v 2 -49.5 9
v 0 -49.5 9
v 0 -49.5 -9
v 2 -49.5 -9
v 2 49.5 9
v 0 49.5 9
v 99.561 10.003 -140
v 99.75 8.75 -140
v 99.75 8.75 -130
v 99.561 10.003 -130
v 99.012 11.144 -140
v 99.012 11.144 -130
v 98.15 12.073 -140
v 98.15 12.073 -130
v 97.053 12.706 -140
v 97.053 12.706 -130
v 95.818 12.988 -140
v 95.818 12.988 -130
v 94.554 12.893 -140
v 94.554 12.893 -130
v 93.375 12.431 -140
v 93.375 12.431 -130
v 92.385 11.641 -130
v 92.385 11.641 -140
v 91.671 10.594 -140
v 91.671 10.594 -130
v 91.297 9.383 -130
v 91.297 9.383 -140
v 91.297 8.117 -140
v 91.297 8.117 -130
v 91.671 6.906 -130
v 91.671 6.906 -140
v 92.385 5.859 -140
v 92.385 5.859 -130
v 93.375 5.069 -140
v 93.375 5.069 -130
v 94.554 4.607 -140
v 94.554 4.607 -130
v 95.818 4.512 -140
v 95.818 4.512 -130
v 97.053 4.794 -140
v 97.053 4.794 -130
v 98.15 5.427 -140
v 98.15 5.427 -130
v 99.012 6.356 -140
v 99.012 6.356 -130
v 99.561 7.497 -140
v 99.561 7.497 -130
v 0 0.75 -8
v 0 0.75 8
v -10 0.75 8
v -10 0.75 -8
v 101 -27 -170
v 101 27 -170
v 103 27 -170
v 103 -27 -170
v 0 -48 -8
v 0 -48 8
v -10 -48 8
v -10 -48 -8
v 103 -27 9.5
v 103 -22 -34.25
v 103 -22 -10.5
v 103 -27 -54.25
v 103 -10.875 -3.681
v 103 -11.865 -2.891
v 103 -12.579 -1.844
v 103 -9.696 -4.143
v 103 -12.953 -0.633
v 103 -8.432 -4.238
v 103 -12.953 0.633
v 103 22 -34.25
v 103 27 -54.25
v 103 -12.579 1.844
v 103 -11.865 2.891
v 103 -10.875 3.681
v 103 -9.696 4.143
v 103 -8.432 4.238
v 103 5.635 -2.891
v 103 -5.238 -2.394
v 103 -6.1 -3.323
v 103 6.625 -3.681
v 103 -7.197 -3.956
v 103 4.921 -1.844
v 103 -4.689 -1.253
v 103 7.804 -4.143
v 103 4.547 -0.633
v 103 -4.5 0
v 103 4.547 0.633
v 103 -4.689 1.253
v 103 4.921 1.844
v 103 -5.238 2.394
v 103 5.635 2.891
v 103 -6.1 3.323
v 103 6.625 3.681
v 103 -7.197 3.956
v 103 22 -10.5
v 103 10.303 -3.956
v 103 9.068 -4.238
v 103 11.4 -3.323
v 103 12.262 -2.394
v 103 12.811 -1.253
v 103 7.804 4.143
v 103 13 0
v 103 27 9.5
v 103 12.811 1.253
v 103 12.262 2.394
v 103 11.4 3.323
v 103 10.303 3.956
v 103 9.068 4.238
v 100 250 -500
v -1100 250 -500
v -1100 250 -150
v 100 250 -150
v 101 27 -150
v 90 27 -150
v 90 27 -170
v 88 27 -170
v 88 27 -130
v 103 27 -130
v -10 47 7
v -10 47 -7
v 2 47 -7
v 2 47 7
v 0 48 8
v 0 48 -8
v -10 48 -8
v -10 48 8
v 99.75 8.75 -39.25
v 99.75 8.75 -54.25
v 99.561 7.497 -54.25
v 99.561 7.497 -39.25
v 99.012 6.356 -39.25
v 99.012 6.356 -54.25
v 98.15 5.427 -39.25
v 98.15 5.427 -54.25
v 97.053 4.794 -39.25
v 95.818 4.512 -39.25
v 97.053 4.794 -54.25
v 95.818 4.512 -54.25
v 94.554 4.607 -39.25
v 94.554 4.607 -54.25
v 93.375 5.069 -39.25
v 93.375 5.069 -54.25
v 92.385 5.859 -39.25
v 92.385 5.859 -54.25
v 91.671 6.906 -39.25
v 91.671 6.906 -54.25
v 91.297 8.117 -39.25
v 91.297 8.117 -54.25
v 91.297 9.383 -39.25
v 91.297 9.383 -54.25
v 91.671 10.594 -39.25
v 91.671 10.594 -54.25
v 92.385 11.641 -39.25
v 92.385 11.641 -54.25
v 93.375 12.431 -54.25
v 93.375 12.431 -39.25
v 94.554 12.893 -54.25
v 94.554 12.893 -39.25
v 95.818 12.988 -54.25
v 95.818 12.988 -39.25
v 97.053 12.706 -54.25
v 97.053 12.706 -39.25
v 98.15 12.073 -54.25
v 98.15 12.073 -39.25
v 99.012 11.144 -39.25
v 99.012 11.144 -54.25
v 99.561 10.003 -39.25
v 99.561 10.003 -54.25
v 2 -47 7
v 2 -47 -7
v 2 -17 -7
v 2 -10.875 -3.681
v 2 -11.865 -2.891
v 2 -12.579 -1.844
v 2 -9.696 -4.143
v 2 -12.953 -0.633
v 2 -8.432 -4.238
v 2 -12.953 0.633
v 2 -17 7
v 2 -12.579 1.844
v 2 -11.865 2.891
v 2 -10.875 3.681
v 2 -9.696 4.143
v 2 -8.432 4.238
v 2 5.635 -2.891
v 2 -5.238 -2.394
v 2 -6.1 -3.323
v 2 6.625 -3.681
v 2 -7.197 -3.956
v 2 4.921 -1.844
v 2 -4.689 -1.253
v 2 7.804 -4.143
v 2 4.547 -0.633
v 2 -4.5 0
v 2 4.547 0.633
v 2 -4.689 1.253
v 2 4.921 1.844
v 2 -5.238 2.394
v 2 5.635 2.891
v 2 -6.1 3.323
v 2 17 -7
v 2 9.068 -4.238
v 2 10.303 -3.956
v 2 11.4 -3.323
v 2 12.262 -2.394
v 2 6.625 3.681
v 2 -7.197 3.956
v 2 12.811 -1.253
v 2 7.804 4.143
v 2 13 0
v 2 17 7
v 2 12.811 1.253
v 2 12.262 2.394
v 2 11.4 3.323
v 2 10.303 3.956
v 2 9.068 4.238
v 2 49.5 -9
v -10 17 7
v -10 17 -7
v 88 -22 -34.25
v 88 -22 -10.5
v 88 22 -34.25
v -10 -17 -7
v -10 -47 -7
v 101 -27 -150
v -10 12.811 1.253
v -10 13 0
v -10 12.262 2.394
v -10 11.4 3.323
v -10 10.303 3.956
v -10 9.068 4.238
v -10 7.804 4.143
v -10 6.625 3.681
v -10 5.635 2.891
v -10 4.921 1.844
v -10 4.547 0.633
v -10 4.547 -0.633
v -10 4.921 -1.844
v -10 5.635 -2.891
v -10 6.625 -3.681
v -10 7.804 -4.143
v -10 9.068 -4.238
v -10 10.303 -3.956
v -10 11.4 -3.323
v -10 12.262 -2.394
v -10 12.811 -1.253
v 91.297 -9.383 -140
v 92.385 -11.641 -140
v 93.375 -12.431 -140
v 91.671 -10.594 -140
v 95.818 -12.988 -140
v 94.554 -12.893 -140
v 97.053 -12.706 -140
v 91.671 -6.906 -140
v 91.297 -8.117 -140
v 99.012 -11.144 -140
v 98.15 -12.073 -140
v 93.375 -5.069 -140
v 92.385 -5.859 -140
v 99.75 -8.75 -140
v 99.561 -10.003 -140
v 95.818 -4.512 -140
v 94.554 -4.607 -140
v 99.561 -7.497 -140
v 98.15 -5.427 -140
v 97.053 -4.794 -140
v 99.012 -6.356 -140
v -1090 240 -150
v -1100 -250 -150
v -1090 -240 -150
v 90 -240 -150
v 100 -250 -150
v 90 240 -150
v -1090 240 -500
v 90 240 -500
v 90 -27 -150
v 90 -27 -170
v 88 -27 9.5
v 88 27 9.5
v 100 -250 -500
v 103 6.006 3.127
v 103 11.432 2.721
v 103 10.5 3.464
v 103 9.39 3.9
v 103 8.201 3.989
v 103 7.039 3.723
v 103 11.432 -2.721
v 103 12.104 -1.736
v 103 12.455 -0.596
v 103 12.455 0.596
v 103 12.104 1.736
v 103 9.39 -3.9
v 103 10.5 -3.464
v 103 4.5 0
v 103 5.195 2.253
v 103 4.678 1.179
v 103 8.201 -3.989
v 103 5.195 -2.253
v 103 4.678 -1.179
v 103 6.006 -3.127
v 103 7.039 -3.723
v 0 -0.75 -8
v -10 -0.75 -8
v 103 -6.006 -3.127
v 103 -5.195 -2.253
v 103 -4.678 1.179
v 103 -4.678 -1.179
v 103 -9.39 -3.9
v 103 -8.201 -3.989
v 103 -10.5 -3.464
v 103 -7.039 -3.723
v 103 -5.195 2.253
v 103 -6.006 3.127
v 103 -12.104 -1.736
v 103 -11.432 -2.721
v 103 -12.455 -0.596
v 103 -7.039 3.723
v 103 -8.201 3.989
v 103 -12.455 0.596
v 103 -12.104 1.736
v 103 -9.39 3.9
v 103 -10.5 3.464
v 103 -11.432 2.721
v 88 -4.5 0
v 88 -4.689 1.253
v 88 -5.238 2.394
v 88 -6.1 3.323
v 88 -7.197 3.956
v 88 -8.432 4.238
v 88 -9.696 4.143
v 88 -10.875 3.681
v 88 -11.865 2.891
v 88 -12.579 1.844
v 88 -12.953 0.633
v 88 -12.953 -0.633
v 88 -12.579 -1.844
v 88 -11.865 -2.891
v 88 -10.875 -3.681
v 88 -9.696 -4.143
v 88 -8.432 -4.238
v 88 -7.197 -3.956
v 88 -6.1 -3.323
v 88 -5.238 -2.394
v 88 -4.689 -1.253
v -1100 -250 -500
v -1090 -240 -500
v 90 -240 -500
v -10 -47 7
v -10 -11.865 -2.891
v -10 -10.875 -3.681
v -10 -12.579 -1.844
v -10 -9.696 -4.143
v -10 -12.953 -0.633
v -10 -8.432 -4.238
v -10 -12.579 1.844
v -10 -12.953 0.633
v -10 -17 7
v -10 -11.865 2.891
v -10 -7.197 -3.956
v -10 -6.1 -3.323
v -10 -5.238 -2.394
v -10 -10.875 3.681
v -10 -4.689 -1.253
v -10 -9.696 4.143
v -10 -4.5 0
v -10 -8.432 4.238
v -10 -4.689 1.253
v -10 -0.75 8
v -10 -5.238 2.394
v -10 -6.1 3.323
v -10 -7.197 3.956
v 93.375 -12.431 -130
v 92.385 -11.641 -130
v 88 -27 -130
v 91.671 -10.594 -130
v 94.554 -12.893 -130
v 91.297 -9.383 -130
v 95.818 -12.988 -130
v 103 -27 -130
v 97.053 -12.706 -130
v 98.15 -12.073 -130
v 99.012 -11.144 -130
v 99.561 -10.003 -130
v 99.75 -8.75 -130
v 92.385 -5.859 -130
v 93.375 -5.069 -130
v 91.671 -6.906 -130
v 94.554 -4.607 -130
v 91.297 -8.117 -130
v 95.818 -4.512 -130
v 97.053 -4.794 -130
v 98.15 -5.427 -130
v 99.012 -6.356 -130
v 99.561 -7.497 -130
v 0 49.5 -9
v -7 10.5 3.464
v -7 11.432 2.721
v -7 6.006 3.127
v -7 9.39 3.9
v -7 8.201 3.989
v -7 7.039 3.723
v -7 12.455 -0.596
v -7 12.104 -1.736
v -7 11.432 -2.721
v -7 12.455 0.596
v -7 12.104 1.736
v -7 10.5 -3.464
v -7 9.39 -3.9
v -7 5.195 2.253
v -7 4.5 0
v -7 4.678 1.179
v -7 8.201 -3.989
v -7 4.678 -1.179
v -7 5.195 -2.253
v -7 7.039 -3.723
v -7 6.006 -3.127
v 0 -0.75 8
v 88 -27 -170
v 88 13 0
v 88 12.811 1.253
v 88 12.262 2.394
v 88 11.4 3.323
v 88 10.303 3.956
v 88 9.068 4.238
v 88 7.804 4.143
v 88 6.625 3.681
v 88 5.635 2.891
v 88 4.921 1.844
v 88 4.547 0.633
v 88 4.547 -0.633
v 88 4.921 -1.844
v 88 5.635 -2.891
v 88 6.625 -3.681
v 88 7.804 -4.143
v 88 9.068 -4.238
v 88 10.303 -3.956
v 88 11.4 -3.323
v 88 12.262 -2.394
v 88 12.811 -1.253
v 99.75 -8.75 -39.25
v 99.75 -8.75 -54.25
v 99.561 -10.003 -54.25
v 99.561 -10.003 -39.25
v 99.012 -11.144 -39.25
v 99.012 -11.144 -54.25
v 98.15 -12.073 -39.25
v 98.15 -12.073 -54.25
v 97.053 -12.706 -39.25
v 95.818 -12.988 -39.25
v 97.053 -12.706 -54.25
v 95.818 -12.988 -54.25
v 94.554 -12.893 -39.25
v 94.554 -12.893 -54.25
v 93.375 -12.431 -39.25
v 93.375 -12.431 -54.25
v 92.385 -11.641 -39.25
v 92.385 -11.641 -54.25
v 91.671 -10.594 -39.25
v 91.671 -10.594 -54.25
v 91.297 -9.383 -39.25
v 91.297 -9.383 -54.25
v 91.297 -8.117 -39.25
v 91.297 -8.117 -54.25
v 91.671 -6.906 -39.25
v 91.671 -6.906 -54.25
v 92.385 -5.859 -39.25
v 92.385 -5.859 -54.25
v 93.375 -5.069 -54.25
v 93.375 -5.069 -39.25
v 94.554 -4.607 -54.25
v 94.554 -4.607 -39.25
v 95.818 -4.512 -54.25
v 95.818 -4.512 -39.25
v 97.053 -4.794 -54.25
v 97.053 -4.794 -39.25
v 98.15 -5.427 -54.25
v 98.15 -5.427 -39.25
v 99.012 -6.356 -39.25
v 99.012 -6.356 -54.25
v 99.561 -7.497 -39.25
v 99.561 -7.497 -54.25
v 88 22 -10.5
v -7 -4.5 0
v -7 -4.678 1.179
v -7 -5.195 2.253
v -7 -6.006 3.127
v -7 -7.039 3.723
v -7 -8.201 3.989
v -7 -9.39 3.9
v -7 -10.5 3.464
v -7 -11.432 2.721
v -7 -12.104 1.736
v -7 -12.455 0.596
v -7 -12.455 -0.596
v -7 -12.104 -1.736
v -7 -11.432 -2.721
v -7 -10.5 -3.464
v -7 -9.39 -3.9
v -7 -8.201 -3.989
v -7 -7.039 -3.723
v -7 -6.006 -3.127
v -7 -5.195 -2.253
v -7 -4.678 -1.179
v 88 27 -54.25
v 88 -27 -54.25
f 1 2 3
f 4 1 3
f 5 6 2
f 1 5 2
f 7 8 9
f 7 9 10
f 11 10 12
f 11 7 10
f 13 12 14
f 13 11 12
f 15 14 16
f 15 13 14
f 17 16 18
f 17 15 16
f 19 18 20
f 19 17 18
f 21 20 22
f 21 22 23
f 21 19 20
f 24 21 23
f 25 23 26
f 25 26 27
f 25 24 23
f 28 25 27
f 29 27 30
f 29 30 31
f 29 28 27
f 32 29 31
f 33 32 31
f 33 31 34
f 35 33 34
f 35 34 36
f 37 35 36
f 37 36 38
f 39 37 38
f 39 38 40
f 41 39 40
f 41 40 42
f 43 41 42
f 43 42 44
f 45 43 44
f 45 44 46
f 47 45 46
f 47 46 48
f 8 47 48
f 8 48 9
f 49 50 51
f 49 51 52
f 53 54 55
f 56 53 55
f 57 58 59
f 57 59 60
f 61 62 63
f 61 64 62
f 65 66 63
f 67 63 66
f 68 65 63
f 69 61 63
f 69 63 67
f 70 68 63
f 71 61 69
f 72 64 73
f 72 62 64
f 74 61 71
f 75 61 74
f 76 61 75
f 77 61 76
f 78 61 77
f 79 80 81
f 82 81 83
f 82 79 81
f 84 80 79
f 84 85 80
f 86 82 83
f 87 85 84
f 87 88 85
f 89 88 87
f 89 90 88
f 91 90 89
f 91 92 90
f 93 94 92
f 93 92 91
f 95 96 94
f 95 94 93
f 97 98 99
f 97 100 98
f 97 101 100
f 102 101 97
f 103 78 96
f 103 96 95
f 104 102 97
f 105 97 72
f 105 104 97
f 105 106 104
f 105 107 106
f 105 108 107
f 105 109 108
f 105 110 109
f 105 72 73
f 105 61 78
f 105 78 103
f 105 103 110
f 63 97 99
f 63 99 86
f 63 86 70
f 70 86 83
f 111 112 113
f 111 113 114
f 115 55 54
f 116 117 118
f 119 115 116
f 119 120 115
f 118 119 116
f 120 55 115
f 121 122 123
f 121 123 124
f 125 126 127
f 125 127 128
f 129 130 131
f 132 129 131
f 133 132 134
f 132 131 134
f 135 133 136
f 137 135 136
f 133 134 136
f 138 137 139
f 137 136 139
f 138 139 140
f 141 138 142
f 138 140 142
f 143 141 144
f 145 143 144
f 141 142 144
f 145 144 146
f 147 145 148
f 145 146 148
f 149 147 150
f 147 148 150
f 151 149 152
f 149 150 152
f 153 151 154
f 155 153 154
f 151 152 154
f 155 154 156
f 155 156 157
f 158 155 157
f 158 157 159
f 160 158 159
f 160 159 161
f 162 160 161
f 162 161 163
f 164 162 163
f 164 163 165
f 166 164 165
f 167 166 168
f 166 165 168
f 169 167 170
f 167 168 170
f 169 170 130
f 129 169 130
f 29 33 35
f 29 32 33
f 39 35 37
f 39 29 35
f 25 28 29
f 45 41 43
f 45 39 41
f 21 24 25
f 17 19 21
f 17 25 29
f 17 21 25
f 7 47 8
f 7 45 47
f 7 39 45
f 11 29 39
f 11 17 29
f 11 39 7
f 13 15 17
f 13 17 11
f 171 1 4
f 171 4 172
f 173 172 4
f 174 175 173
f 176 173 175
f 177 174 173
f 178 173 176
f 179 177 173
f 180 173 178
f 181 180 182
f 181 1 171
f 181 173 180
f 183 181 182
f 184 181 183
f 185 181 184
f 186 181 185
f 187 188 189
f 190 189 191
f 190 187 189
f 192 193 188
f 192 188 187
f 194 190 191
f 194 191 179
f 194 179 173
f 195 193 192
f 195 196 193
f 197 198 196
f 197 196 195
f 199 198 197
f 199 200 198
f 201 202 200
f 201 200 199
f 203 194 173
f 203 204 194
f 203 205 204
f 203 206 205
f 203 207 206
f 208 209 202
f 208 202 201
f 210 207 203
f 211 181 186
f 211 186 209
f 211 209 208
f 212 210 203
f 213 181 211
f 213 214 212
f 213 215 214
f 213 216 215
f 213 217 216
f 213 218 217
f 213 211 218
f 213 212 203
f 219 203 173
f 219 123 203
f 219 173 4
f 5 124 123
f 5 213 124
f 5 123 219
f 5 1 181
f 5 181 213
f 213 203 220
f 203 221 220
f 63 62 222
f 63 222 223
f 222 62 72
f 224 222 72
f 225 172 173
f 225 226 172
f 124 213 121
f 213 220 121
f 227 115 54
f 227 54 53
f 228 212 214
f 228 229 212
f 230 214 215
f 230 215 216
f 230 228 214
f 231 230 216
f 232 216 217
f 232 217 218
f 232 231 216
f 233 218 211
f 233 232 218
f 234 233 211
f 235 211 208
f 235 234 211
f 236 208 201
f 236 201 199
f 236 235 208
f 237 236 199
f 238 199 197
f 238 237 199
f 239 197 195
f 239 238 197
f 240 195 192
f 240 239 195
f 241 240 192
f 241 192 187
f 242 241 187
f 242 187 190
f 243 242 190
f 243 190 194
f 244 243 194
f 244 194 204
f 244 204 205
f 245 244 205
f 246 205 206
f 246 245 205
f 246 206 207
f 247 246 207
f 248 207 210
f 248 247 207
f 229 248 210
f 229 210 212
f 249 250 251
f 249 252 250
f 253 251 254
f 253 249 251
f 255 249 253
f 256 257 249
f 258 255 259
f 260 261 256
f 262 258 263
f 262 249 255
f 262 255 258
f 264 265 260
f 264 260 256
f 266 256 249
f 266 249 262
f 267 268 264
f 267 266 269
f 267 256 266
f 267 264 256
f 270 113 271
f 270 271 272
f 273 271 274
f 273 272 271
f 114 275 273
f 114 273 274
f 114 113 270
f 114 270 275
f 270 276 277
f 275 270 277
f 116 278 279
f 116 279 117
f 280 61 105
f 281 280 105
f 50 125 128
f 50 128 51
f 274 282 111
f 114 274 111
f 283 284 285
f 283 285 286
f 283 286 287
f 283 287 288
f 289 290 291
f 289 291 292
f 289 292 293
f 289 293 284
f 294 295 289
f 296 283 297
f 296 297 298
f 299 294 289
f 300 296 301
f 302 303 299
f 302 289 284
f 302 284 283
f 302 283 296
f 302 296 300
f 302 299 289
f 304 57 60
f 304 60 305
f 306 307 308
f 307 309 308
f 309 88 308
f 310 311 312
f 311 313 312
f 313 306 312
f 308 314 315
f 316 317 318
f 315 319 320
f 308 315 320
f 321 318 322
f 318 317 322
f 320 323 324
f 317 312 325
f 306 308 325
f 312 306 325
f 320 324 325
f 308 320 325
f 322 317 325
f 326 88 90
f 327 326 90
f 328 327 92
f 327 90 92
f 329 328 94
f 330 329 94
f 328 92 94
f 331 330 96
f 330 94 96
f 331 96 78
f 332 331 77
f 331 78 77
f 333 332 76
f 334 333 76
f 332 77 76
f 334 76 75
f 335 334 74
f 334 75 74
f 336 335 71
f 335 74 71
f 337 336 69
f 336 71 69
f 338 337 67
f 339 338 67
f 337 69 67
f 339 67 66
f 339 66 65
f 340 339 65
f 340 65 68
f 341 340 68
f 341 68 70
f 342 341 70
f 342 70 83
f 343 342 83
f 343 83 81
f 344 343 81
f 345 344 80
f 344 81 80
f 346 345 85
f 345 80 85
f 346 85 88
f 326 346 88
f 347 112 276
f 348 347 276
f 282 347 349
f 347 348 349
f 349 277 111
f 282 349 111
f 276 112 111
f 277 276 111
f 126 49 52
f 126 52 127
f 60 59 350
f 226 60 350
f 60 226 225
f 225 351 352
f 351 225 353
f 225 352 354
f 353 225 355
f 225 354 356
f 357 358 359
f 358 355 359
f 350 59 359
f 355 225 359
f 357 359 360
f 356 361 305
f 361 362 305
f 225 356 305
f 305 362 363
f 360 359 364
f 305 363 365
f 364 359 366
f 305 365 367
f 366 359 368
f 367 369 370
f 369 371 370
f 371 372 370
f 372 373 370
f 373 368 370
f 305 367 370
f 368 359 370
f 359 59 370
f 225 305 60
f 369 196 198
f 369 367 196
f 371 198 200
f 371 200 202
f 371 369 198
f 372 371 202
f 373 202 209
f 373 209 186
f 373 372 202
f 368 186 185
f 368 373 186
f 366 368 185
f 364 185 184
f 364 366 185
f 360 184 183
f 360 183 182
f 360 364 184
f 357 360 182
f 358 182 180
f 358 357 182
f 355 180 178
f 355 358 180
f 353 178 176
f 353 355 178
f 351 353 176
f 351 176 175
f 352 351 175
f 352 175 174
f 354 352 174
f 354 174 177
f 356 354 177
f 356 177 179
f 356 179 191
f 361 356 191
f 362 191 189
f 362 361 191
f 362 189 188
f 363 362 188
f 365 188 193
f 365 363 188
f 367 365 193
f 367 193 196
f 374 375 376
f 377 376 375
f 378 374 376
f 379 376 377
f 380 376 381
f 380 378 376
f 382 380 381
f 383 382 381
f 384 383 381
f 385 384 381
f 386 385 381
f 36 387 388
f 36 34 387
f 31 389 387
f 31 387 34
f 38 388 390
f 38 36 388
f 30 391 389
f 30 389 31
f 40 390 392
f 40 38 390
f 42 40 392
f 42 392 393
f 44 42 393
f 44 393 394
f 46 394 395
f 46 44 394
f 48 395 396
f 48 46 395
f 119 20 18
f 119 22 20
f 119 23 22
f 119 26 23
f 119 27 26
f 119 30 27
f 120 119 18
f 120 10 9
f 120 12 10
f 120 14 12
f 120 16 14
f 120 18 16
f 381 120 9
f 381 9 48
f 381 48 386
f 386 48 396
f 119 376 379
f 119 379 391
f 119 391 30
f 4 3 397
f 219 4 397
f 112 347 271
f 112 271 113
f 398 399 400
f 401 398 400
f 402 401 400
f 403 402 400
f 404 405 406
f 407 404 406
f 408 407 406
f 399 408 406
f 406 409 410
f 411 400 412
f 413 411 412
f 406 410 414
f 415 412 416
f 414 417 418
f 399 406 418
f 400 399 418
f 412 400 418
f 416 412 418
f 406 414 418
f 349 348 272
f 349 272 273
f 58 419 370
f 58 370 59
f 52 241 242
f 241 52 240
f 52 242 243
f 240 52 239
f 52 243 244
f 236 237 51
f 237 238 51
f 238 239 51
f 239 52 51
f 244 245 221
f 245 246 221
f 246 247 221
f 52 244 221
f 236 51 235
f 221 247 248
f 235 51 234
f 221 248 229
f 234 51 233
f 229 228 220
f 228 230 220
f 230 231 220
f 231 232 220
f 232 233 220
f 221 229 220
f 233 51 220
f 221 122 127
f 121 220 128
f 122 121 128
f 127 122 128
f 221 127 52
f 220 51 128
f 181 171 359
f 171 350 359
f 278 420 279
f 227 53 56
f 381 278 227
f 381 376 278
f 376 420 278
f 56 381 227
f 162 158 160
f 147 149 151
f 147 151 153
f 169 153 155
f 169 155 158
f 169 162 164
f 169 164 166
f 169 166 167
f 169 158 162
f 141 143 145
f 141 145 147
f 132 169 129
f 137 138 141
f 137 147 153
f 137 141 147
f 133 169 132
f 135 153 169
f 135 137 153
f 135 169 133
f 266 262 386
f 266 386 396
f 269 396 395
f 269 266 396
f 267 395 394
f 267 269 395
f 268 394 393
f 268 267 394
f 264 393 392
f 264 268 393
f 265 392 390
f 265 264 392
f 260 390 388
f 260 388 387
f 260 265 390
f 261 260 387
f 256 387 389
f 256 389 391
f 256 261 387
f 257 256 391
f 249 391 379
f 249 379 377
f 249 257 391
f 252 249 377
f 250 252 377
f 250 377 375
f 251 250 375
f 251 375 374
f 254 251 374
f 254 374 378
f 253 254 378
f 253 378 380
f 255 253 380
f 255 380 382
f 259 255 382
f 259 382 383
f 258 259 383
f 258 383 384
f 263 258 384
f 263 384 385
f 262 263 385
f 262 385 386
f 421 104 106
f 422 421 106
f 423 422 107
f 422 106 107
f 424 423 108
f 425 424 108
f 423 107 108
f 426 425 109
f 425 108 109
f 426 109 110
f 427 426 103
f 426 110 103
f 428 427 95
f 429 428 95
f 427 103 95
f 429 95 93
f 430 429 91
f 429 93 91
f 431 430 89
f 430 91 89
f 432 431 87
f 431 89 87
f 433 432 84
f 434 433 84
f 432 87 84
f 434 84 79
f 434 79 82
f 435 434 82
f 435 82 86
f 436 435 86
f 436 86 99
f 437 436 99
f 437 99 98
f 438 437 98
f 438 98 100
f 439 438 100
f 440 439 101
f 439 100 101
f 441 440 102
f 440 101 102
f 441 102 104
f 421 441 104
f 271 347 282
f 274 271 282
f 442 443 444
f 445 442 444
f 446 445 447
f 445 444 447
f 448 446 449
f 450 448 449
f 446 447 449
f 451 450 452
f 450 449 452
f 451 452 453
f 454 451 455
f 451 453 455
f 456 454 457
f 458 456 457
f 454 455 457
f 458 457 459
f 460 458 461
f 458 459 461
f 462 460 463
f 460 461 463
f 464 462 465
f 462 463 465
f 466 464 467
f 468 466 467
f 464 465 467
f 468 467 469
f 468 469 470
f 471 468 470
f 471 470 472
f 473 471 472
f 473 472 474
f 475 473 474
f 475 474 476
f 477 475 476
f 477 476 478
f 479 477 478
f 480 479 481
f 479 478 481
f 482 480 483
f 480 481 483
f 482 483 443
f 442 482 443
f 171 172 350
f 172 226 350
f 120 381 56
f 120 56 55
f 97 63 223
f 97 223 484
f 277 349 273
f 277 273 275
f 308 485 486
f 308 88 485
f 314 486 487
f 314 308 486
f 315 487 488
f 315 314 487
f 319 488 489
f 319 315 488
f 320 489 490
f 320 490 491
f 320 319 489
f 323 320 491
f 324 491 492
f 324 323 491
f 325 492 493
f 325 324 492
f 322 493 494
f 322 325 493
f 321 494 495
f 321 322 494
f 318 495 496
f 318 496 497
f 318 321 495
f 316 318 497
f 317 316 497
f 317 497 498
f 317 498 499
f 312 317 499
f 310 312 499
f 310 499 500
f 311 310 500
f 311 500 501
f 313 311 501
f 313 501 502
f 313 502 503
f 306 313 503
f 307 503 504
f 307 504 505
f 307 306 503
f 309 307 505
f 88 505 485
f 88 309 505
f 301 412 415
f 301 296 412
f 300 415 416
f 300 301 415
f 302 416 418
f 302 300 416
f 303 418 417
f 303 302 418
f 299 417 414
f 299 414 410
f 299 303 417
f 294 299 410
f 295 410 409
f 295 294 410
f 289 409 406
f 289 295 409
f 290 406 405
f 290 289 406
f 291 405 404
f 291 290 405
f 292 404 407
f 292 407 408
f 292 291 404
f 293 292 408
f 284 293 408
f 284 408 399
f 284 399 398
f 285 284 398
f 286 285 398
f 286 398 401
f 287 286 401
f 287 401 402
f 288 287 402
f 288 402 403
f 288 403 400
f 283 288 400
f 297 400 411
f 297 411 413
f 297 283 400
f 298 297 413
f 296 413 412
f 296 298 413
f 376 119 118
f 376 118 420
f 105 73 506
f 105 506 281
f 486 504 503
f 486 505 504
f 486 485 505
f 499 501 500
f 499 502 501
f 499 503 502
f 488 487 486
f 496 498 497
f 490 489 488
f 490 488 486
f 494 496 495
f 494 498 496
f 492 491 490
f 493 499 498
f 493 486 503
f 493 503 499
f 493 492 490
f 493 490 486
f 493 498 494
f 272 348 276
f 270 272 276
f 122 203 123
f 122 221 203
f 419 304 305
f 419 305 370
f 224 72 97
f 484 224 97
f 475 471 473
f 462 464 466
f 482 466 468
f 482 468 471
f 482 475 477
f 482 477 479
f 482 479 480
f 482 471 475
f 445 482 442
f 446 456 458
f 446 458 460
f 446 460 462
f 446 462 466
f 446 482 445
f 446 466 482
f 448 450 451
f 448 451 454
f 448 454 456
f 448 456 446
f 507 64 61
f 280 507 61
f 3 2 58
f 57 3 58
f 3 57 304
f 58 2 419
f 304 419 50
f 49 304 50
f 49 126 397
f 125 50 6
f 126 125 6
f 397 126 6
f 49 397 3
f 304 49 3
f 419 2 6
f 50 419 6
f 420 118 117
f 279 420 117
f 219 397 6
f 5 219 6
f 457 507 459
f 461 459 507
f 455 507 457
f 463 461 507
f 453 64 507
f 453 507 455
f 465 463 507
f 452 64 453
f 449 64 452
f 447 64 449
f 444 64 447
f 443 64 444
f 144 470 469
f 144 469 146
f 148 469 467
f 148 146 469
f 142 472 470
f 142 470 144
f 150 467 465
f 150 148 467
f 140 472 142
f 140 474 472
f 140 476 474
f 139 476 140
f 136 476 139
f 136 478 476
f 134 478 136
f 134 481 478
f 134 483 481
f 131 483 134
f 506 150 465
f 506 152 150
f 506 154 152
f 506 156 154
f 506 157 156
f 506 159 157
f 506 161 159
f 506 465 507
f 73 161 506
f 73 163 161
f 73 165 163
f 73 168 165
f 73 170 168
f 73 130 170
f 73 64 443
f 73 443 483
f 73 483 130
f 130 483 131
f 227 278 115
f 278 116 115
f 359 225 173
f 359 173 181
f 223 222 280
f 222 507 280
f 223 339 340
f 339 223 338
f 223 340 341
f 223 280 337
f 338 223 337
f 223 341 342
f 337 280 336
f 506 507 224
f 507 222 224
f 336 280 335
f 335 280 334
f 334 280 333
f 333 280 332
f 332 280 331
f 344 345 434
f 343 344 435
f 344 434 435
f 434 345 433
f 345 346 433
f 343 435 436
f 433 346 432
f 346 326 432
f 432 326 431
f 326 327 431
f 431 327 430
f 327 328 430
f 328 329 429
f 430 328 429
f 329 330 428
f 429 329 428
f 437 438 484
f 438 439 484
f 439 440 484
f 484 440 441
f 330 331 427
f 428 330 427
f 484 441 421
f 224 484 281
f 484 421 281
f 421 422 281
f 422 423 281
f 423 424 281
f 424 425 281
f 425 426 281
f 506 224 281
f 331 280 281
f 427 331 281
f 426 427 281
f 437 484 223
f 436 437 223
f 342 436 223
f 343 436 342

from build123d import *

# Parameters (mm, degrees)
F0_W          = 1.5
F0_H          = 1
F0_H_2        = 16
F0_R          = 4.25
F0_W_2        = 30
F0_H_3        = 14
F1_DEPTH      = 2
F2_DEPTH      = 10
F2_DEPTH_BACK = 2
F5_W          = 1200
F5_H          = 500
F5_W_2        = 1180
F5_H_2        = 480
F6_DEPTH      = 350
F8_W          = 10
F8_H          = 2
F8_W_2        = 1
F8_H_2        = 50
F8_R          = 4.25
F9_DEPTH      = 10
F8_W_3        = 11
F10_DEPTH     = 20
F12_DEPTH     = 15
F13_DEPTH     = 20
F14_W         = 54
F14_H         = 63.75
F14_R         = 4.25
F14_W_2       = 44
F14_H_2       = 23.75
F15_DEPTH     = 15
F16_W         = 110
F16_H         = 4
F19_R         = 4.25
F20_DEPTH     = 15


# Not quite as in the source:
# - a feature names something its author has since deleted; it is built from what else it names
# - the program builds the solid bodies; features that only make, move or delete a surface that nothing else refers to are left out


with BuildPart() as f1:
    # F0 (on Right) → F1 (new body)
    with BuildSketch(Plane.YZ):
        Polygon((-0.75, 9), (-49.5, 9), (-49.5, -9), (-0.75, -9), (-0.75, -8), (-13, -8), (-16, -8), (-48, -8), (-48, 8), (-16, 8), (-13, 8), (-0.75, 8), align=None)
        with Locations((0, 8.5)):
            Rectangle(F0_W, F0_H)
        Polygon((49.5, 9), (0.75, 9), (0.75, 8), (13, 8), (16, 8), (48, 8), (48, -8), (16, -8), (13, -8), (0.75, -8), (0.75, -9), (49.5, -9), align=None)
        with Locations((0, -8.5)):
            Rectangle(F0_W, F0_H)
        Rectangle(F0_W, F0_H_2)
        Polygon((13, 8), (0.75, 8), (0.75, -8), (13, -8), (16, -8), (48, -8), (48, 8), (16, 8), align=None)
        with Locations((8.75, 0)):
            Circle(F0_R, mode=Mode.SUBTRACT)
        with Locations((32, 0)):
            Rectangle(F0_W_2, F0_H_3, mode=Mode.SUBTRACT)
    extrude(amount=F1_DEPTH)

    # F0 (on Right) → F2 (join, two sides)
    with BuildSketch(Plane.YZ) as f2_sk:
        Polygon((-0.75, -8), (-0.75, 8), (-13, 8), (-16, 8), (-48, 8), (-48, -8), (-16, -8), (-13, -8), align=None)
        with Locations((-32, 0)):
            Rectangle(F0_W_2, F0_H_3, mode=Mode.SUBTRACT)
        with Locations((-8.75, 0)):
            Circle(F0_R, mode=Mode.SUBTRACT)
        Polygon((13, 8), (0.75, 8), (0.75, -8), (13, -8), (16, -8), (48, -8), (48, 8), (16, 8), align=None)
        with Locations((8.75, 0)):
            Circle(F0_R, mode=Mode.SUBTRACT)
        with Locations((32, 0)):
            Rectangle(F0_W_2, F0_H_3, mode=Mode.SUBTRACT)
    extrude(amount=-F2_DEPTH)
    extrude(f2_sk.sketch, amount=F2_DEPTH_BACK)


with BuildPart() as f6:
    # F5 (on offset) → F6 (new body)
    with BuildSketch(Plane.XY.offset(-500)):
        with Locations((-500, 0)):
            Rectangle(F5_W, F5_H)
        with Locations((-500, 0)):
            Rectangle(F5_W_2, F5_H_2, mode=Mode.SUBTRACT)
    extrude(amount=F6_DEPTH)


with BuildPart() as f9:
    # F8 (on face) → F9 (new body)
    with BuildSketch(Plane.XY.offset(-150)):
        Polygon((101, 27), (101, 25), (101, -25), (101, -27), (103, -27), (103, 27), align=None)
        Polygon((90, -25), (90, 25), (90, 27), (88, 27), (88, -27), (90, -27), align=None)
        with Locations((95, 26)):
            Rectangle(F8_W, F8_H)
        with Locations((100.5, 26)):
            Rectangle(F8_W_2, F8_H)
        with Locations((100.5, -26)):
            Rectangle(F8_W_2, F8_H)
        with Locations((95, -26)):
            Rectangle(F8_W, F8_H)
        with Locations((100.5, 0)):
            Rectangle(F8_W_2, F8_H_2)
        with Locations((95, 0)):
            Rectangle(F8_W, F8_H_2)
        with Locations((95.5, -8.75)):
            Circle(F8_R, mode=Mode.SUBTRACT)
        with Locations((95.5, 8.75)):
            Circle(F8_R, mode=Mode.SUBTRACT)
        with Locations((95.5, 8.75)):
            Circle(F8_R)
        with Locations((95.5, -8.75)):
            Circle(F8_R)
    extrude(amount=F9_DEPTH)

    # F8 (on face) → F10 (join)
    with BuildSketch(Plane.XY.offset(-150)):
        with Locations((95.5, 26)):
            Rectangle(F8_W_3, F8_H)
        Polygon((90, -25), (90, 25), (90, 27), (88, 27), (88, -27), (90, -27), align=None)
        Polygon((101, 27), (101, 25), (101, -25), (101, -27), (103, -27), (103, 27), align=None)
        with Locations((95.5, -26)):
            Rectangle(F8_W_3, F8_H)
        with Locations((95, 0)):
            Rectangle(F8_W, F8_H_2)
        with Locations((95.5, -8.75)):
            Circle(F8_R, mode=Mode.SUBTRACT)
        with Locations((95.5, 8.75)):
            Circle(F8_R, mode=Mode.SUBTRACT)
        with Locations((100.5, 0)):
            Rectangle(F8_W_2, F8_H_2)
    extrude(amount=F10_DEPTH)

    # F12 (add): a face of the model
    f12_faces = [f9.faces().sort_by_distance(p)[0] for p in [
        (95.5, 0, -130),
    ]]
    extrude(f12_faces, amount=-F12_DEPTH)

    # F8 (on face) → F13 (join)
    with BuildSketch(Plane.XY.offset(-150)):
        Polygon((90, -25), (90, 25), (90, 27), (88, 27), (88, -27), (90, -27), align=None)
        Polygon((101, 27), (101, 25), (101, -25), (101, -27), (103, -27), (103, 27), align=None)
    extrude(amount=-F13_DEPTH)


with BuildPart() as f15:
    # F14 (on face) → F15 (new body)
    with BuildSketch(Plane.YZ.offset(103)):
        with Locations((0, -22.375)):
            Rectangle(F14_W, F14_H)
        with Locations((-8.75, 0)):
            Circle(F14_R, mode=Mode.SUBTRACT)
        with Locations((0, -22.375)):
            Rectangle(F14_W_2, F14_H_2, mode=Mode.SUBTRACT)
        with Locations((8.75, 0)):
            Circle(F14_R, mode=Mode.SUBTRACT)
    extrude(amount=-F15_DEPTH)

    # F19 (on face) → F20 (cut)
    with BuildSketch(Plane(origin=(0, 0, -54.25), x_dir=(1, 0, 0), z_dir=(0, 0, -1))):
        with Locations((95.5, 8.75)):
            Circle(F19_R)
        with Locations((95.5, -8.75)):
            Circle(F19_R)
    extrude(amount=-F20_DEPTH, mode=Mode.SUBTRACT)


with BuildPart() as f17:
    # F16 (on Top) → F17 (revolve)
    with BuildSketch(Plane.XY):
        with Locations((48, -6.5)):
            Rectangle(F16_W, F16_H)
    revolve(axis=Axis((48, -8.5, 0), (1, 0, 0)))


with BuildPart() as f18:
    # F16 (on Top) → F18 (revolve)
    with BuildSketch(Plane.XY):
        with Locations((48, 6.5)):
            Rectangle(F16_W, F16_H)
    revolve(axis=Axis((48, 8.5, 0), (1, 0, 0)))


solid = Compound([f1.part, f6.part, f9.part, f15.part, f17.part, f18.part])
